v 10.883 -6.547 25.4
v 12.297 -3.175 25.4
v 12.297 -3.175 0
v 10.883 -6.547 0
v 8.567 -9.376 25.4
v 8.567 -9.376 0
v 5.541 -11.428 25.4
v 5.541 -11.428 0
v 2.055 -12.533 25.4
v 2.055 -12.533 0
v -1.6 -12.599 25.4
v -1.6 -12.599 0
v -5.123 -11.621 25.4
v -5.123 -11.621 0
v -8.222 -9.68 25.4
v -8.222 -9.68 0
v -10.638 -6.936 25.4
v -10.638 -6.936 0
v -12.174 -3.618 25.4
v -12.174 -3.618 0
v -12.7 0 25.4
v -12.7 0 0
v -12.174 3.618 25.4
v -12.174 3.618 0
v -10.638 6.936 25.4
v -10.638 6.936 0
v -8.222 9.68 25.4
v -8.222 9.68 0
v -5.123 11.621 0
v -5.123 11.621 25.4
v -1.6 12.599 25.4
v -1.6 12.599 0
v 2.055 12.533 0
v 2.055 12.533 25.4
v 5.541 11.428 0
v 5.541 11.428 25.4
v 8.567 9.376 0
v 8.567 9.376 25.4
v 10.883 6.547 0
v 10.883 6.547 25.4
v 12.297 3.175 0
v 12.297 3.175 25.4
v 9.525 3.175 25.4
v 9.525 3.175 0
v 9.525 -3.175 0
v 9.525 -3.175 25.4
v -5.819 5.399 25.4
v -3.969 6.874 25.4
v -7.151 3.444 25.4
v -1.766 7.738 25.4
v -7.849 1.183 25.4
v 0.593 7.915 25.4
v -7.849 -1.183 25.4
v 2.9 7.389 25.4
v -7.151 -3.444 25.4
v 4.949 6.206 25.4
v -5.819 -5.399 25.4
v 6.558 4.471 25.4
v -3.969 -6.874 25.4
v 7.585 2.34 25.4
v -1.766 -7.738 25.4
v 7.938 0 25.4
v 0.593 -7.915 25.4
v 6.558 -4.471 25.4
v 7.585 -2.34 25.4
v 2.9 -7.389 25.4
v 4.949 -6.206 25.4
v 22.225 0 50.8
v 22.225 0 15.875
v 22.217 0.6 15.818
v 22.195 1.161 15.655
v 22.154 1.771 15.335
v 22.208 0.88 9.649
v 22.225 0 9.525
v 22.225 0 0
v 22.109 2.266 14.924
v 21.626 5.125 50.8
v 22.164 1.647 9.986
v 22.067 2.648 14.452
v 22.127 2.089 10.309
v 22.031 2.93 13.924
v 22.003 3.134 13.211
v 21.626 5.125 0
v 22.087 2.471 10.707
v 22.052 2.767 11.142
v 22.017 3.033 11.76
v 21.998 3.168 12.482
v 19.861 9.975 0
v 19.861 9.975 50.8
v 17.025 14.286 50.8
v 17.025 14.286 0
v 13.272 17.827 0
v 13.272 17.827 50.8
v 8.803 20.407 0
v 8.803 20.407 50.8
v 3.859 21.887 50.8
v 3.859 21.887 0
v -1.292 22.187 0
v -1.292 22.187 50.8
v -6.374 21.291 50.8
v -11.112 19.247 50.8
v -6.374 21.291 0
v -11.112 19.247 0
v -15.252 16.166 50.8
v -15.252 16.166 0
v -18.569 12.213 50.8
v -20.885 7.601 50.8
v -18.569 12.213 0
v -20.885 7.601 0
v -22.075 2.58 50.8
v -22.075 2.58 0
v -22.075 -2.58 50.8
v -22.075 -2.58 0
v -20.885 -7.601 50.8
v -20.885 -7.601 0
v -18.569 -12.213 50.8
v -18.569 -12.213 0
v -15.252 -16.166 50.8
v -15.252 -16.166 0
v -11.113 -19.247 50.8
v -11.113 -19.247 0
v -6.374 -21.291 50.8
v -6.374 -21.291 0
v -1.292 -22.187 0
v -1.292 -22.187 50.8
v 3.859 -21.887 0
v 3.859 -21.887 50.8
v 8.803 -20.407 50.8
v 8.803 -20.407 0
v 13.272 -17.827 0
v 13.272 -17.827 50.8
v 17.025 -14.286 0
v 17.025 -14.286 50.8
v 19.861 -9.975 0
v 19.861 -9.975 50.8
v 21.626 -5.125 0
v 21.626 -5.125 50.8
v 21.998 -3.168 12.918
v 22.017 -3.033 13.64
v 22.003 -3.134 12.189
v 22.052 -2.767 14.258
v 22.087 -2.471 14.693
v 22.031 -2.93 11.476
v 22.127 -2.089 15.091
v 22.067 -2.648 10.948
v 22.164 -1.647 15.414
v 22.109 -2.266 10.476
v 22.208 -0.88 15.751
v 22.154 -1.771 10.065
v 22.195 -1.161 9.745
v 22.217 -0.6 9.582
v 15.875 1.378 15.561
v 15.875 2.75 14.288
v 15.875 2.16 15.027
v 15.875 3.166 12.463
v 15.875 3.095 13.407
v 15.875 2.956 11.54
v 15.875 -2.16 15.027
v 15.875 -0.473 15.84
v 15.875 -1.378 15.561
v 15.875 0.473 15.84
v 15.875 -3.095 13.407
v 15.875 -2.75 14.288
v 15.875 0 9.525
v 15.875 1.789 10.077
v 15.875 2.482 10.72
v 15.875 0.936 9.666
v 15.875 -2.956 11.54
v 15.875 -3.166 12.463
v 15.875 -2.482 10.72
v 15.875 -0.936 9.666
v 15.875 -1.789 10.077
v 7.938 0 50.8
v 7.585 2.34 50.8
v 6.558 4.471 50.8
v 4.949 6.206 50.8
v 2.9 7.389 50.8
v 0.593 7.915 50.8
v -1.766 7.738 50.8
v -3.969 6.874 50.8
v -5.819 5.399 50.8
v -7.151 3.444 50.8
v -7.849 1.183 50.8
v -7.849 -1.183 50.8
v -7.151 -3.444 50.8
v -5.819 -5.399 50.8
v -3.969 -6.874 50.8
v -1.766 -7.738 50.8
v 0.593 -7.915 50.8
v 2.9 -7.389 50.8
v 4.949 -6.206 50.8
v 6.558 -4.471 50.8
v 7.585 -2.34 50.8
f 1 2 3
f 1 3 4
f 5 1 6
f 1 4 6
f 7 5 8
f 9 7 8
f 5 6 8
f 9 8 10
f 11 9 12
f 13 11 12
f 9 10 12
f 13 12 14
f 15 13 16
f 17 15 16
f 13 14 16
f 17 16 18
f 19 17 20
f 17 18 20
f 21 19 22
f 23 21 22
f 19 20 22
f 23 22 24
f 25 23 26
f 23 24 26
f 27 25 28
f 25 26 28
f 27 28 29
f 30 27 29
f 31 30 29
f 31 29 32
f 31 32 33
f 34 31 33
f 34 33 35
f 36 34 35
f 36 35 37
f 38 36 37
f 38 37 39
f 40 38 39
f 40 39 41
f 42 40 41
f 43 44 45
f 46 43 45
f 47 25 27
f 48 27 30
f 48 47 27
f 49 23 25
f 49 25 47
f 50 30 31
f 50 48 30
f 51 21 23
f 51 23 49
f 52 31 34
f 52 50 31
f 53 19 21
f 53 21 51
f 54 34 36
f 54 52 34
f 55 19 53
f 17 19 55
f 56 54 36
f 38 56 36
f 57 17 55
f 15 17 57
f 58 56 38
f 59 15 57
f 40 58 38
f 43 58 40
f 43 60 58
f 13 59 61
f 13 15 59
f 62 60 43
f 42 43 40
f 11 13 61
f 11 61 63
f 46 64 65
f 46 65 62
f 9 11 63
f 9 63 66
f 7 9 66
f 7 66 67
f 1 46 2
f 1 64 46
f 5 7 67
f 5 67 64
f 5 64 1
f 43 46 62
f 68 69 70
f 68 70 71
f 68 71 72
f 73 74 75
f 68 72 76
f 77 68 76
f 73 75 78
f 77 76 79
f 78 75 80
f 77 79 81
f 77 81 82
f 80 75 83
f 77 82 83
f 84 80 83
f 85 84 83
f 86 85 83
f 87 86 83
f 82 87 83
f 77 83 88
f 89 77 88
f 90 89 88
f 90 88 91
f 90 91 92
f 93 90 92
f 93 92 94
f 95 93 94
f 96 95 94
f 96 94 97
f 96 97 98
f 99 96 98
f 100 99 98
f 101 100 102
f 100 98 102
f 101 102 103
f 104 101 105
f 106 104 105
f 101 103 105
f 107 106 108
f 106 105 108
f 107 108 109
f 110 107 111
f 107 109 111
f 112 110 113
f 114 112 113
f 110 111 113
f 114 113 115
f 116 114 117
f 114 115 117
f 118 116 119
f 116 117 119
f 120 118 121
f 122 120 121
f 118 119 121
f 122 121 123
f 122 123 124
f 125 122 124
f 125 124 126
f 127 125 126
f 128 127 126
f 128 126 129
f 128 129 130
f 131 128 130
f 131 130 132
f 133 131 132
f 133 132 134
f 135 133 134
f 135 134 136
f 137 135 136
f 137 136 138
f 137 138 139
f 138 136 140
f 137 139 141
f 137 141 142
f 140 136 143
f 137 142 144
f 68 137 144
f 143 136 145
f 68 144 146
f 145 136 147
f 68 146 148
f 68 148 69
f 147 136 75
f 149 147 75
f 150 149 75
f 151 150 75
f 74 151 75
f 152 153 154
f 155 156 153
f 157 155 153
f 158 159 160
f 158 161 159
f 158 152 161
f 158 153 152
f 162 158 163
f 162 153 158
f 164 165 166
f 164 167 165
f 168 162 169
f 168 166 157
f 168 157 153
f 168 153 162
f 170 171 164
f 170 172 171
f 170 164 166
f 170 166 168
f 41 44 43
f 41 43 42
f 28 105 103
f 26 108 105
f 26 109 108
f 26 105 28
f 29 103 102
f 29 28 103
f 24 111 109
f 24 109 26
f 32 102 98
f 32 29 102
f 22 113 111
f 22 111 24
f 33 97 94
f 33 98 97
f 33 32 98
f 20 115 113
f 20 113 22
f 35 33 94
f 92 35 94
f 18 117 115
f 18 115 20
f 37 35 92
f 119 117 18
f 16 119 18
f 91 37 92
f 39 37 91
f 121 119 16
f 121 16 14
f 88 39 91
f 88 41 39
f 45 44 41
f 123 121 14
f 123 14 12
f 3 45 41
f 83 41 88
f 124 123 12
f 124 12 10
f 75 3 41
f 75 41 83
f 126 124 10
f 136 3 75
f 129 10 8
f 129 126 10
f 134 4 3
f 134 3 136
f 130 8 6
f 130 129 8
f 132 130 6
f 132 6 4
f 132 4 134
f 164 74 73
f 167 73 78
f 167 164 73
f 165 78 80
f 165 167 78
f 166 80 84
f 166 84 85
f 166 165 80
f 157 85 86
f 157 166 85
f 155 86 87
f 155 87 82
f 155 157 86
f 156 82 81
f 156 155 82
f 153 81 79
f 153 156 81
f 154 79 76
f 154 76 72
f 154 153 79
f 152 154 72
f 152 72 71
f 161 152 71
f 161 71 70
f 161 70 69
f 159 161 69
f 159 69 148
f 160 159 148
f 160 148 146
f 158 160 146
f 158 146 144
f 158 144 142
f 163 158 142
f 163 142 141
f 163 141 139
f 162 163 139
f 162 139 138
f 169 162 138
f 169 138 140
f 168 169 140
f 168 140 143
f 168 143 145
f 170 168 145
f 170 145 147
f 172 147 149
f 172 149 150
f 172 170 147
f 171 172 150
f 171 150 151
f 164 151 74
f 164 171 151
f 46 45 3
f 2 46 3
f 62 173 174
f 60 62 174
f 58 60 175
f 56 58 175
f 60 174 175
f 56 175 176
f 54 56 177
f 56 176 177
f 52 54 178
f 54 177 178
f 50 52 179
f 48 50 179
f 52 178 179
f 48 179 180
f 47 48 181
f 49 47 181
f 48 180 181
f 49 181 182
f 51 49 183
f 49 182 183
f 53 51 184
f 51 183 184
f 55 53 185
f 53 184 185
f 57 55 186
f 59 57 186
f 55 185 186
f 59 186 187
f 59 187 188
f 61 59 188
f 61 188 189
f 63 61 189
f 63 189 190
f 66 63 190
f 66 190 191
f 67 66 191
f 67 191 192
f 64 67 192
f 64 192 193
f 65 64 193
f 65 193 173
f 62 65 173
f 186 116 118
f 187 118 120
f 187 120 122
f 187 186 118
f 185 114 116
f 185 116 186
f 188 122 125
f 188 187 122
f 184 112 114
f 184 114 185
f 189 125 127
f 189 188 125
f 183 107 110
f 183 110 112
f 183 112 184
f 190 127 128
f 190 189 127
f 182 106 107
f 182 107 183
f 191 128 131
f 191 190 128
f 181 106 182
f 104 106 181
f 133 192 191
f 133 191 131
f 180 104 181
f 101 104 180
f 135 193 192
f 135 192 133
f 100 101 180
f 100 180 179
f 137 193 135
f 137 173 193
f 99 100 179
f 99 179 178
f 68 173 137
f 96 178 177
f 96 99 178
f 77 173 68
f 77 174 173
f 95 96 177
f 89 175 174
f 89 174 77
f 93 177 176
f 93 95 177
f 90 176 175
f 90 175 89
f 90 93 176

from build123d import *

# Parameters (mm, degrees)
CYLINDER001_R           = 3.175
CYLINDER001_DEPTH       = 25.4
CYLINDER001_PITCH_ANGLE = 90
CYLINDER_R              = 22.225
CYLINDER_DEPTH          = 50.8
SKETCH_R                = 7.9375
POCKET_DEPTH            = 50.801
SKETCH001_R             = 12.7
POCKET001_DEPTH         = 25.4
SKETCH002_W             = 6.35
SKETCH002_H             = 6.35
PAD_DEPTH               = 25.4


with BuildPart() as cylinder001:
    # Cylinder001 → Cylinder001 (new body)
    with BuildSketch(Plane.XY):
        Circle(CYLINDER001_R)
    extrude(amount=CYLINDER001_DEPTH)


with BuildPart() as cylinder001_1:
    # Cylinder001 pitch: moved
    add(cylinder001.part.rotate(Axis((0, 0, 0), (0, 1, 0)), CYLINDER001_PITCH_ANGLE))


with BuildPart() as cylinder001_2:
    # Cylinder001 placement: moved
    add(cylinder001_1.part.moved(Location((1.93153, 0, 12.7))))


with BuildPart() as f_0_25in_key:
    # Cylinder → Cylinder (new body)
    with BuildSketch(Plane.XY):
        Circle(CYLINDER_R)
    extrude(amount=CYLINDER_DEPTH)

    # Sketch → Pocket (cut, through all)
    with BuildSketch(Plane.XY.offset(50.8)):
        Circle(SKETCH_R)
    extrude(amount=-POCKET_DEPTH, mode=Mode.SUBTRACT)

    # Cut: cut Cylinder001
    add(cylinder001_2.part, mode=Mode.SUBTRACT)

    # Sketch001 → Pocket001 (cut)
    with BuildSketch(Plane(origin=(0, 0, 0), x_dir=(1, 0, 0), z_dir=(0, 0, -1))):
        Circle(SKETCH001_R)
    extrude(amount=-POCKET001_DEPTH, mode=Mode.SUBTRACT)

    # Sketch002 → Pad (new body)
    with BuildSketch(Plane(origin=(0, 0, 0), x_dir=(1, 0, 0), z_dir=(0, 0, -1))):
        with Locations((12.7, 0)):
            Rectangle(SKETCH002_W, SKETCH002_H)
    extrude(amount=-PAD_DEPTH)


solid = f_0_25in_key.part
